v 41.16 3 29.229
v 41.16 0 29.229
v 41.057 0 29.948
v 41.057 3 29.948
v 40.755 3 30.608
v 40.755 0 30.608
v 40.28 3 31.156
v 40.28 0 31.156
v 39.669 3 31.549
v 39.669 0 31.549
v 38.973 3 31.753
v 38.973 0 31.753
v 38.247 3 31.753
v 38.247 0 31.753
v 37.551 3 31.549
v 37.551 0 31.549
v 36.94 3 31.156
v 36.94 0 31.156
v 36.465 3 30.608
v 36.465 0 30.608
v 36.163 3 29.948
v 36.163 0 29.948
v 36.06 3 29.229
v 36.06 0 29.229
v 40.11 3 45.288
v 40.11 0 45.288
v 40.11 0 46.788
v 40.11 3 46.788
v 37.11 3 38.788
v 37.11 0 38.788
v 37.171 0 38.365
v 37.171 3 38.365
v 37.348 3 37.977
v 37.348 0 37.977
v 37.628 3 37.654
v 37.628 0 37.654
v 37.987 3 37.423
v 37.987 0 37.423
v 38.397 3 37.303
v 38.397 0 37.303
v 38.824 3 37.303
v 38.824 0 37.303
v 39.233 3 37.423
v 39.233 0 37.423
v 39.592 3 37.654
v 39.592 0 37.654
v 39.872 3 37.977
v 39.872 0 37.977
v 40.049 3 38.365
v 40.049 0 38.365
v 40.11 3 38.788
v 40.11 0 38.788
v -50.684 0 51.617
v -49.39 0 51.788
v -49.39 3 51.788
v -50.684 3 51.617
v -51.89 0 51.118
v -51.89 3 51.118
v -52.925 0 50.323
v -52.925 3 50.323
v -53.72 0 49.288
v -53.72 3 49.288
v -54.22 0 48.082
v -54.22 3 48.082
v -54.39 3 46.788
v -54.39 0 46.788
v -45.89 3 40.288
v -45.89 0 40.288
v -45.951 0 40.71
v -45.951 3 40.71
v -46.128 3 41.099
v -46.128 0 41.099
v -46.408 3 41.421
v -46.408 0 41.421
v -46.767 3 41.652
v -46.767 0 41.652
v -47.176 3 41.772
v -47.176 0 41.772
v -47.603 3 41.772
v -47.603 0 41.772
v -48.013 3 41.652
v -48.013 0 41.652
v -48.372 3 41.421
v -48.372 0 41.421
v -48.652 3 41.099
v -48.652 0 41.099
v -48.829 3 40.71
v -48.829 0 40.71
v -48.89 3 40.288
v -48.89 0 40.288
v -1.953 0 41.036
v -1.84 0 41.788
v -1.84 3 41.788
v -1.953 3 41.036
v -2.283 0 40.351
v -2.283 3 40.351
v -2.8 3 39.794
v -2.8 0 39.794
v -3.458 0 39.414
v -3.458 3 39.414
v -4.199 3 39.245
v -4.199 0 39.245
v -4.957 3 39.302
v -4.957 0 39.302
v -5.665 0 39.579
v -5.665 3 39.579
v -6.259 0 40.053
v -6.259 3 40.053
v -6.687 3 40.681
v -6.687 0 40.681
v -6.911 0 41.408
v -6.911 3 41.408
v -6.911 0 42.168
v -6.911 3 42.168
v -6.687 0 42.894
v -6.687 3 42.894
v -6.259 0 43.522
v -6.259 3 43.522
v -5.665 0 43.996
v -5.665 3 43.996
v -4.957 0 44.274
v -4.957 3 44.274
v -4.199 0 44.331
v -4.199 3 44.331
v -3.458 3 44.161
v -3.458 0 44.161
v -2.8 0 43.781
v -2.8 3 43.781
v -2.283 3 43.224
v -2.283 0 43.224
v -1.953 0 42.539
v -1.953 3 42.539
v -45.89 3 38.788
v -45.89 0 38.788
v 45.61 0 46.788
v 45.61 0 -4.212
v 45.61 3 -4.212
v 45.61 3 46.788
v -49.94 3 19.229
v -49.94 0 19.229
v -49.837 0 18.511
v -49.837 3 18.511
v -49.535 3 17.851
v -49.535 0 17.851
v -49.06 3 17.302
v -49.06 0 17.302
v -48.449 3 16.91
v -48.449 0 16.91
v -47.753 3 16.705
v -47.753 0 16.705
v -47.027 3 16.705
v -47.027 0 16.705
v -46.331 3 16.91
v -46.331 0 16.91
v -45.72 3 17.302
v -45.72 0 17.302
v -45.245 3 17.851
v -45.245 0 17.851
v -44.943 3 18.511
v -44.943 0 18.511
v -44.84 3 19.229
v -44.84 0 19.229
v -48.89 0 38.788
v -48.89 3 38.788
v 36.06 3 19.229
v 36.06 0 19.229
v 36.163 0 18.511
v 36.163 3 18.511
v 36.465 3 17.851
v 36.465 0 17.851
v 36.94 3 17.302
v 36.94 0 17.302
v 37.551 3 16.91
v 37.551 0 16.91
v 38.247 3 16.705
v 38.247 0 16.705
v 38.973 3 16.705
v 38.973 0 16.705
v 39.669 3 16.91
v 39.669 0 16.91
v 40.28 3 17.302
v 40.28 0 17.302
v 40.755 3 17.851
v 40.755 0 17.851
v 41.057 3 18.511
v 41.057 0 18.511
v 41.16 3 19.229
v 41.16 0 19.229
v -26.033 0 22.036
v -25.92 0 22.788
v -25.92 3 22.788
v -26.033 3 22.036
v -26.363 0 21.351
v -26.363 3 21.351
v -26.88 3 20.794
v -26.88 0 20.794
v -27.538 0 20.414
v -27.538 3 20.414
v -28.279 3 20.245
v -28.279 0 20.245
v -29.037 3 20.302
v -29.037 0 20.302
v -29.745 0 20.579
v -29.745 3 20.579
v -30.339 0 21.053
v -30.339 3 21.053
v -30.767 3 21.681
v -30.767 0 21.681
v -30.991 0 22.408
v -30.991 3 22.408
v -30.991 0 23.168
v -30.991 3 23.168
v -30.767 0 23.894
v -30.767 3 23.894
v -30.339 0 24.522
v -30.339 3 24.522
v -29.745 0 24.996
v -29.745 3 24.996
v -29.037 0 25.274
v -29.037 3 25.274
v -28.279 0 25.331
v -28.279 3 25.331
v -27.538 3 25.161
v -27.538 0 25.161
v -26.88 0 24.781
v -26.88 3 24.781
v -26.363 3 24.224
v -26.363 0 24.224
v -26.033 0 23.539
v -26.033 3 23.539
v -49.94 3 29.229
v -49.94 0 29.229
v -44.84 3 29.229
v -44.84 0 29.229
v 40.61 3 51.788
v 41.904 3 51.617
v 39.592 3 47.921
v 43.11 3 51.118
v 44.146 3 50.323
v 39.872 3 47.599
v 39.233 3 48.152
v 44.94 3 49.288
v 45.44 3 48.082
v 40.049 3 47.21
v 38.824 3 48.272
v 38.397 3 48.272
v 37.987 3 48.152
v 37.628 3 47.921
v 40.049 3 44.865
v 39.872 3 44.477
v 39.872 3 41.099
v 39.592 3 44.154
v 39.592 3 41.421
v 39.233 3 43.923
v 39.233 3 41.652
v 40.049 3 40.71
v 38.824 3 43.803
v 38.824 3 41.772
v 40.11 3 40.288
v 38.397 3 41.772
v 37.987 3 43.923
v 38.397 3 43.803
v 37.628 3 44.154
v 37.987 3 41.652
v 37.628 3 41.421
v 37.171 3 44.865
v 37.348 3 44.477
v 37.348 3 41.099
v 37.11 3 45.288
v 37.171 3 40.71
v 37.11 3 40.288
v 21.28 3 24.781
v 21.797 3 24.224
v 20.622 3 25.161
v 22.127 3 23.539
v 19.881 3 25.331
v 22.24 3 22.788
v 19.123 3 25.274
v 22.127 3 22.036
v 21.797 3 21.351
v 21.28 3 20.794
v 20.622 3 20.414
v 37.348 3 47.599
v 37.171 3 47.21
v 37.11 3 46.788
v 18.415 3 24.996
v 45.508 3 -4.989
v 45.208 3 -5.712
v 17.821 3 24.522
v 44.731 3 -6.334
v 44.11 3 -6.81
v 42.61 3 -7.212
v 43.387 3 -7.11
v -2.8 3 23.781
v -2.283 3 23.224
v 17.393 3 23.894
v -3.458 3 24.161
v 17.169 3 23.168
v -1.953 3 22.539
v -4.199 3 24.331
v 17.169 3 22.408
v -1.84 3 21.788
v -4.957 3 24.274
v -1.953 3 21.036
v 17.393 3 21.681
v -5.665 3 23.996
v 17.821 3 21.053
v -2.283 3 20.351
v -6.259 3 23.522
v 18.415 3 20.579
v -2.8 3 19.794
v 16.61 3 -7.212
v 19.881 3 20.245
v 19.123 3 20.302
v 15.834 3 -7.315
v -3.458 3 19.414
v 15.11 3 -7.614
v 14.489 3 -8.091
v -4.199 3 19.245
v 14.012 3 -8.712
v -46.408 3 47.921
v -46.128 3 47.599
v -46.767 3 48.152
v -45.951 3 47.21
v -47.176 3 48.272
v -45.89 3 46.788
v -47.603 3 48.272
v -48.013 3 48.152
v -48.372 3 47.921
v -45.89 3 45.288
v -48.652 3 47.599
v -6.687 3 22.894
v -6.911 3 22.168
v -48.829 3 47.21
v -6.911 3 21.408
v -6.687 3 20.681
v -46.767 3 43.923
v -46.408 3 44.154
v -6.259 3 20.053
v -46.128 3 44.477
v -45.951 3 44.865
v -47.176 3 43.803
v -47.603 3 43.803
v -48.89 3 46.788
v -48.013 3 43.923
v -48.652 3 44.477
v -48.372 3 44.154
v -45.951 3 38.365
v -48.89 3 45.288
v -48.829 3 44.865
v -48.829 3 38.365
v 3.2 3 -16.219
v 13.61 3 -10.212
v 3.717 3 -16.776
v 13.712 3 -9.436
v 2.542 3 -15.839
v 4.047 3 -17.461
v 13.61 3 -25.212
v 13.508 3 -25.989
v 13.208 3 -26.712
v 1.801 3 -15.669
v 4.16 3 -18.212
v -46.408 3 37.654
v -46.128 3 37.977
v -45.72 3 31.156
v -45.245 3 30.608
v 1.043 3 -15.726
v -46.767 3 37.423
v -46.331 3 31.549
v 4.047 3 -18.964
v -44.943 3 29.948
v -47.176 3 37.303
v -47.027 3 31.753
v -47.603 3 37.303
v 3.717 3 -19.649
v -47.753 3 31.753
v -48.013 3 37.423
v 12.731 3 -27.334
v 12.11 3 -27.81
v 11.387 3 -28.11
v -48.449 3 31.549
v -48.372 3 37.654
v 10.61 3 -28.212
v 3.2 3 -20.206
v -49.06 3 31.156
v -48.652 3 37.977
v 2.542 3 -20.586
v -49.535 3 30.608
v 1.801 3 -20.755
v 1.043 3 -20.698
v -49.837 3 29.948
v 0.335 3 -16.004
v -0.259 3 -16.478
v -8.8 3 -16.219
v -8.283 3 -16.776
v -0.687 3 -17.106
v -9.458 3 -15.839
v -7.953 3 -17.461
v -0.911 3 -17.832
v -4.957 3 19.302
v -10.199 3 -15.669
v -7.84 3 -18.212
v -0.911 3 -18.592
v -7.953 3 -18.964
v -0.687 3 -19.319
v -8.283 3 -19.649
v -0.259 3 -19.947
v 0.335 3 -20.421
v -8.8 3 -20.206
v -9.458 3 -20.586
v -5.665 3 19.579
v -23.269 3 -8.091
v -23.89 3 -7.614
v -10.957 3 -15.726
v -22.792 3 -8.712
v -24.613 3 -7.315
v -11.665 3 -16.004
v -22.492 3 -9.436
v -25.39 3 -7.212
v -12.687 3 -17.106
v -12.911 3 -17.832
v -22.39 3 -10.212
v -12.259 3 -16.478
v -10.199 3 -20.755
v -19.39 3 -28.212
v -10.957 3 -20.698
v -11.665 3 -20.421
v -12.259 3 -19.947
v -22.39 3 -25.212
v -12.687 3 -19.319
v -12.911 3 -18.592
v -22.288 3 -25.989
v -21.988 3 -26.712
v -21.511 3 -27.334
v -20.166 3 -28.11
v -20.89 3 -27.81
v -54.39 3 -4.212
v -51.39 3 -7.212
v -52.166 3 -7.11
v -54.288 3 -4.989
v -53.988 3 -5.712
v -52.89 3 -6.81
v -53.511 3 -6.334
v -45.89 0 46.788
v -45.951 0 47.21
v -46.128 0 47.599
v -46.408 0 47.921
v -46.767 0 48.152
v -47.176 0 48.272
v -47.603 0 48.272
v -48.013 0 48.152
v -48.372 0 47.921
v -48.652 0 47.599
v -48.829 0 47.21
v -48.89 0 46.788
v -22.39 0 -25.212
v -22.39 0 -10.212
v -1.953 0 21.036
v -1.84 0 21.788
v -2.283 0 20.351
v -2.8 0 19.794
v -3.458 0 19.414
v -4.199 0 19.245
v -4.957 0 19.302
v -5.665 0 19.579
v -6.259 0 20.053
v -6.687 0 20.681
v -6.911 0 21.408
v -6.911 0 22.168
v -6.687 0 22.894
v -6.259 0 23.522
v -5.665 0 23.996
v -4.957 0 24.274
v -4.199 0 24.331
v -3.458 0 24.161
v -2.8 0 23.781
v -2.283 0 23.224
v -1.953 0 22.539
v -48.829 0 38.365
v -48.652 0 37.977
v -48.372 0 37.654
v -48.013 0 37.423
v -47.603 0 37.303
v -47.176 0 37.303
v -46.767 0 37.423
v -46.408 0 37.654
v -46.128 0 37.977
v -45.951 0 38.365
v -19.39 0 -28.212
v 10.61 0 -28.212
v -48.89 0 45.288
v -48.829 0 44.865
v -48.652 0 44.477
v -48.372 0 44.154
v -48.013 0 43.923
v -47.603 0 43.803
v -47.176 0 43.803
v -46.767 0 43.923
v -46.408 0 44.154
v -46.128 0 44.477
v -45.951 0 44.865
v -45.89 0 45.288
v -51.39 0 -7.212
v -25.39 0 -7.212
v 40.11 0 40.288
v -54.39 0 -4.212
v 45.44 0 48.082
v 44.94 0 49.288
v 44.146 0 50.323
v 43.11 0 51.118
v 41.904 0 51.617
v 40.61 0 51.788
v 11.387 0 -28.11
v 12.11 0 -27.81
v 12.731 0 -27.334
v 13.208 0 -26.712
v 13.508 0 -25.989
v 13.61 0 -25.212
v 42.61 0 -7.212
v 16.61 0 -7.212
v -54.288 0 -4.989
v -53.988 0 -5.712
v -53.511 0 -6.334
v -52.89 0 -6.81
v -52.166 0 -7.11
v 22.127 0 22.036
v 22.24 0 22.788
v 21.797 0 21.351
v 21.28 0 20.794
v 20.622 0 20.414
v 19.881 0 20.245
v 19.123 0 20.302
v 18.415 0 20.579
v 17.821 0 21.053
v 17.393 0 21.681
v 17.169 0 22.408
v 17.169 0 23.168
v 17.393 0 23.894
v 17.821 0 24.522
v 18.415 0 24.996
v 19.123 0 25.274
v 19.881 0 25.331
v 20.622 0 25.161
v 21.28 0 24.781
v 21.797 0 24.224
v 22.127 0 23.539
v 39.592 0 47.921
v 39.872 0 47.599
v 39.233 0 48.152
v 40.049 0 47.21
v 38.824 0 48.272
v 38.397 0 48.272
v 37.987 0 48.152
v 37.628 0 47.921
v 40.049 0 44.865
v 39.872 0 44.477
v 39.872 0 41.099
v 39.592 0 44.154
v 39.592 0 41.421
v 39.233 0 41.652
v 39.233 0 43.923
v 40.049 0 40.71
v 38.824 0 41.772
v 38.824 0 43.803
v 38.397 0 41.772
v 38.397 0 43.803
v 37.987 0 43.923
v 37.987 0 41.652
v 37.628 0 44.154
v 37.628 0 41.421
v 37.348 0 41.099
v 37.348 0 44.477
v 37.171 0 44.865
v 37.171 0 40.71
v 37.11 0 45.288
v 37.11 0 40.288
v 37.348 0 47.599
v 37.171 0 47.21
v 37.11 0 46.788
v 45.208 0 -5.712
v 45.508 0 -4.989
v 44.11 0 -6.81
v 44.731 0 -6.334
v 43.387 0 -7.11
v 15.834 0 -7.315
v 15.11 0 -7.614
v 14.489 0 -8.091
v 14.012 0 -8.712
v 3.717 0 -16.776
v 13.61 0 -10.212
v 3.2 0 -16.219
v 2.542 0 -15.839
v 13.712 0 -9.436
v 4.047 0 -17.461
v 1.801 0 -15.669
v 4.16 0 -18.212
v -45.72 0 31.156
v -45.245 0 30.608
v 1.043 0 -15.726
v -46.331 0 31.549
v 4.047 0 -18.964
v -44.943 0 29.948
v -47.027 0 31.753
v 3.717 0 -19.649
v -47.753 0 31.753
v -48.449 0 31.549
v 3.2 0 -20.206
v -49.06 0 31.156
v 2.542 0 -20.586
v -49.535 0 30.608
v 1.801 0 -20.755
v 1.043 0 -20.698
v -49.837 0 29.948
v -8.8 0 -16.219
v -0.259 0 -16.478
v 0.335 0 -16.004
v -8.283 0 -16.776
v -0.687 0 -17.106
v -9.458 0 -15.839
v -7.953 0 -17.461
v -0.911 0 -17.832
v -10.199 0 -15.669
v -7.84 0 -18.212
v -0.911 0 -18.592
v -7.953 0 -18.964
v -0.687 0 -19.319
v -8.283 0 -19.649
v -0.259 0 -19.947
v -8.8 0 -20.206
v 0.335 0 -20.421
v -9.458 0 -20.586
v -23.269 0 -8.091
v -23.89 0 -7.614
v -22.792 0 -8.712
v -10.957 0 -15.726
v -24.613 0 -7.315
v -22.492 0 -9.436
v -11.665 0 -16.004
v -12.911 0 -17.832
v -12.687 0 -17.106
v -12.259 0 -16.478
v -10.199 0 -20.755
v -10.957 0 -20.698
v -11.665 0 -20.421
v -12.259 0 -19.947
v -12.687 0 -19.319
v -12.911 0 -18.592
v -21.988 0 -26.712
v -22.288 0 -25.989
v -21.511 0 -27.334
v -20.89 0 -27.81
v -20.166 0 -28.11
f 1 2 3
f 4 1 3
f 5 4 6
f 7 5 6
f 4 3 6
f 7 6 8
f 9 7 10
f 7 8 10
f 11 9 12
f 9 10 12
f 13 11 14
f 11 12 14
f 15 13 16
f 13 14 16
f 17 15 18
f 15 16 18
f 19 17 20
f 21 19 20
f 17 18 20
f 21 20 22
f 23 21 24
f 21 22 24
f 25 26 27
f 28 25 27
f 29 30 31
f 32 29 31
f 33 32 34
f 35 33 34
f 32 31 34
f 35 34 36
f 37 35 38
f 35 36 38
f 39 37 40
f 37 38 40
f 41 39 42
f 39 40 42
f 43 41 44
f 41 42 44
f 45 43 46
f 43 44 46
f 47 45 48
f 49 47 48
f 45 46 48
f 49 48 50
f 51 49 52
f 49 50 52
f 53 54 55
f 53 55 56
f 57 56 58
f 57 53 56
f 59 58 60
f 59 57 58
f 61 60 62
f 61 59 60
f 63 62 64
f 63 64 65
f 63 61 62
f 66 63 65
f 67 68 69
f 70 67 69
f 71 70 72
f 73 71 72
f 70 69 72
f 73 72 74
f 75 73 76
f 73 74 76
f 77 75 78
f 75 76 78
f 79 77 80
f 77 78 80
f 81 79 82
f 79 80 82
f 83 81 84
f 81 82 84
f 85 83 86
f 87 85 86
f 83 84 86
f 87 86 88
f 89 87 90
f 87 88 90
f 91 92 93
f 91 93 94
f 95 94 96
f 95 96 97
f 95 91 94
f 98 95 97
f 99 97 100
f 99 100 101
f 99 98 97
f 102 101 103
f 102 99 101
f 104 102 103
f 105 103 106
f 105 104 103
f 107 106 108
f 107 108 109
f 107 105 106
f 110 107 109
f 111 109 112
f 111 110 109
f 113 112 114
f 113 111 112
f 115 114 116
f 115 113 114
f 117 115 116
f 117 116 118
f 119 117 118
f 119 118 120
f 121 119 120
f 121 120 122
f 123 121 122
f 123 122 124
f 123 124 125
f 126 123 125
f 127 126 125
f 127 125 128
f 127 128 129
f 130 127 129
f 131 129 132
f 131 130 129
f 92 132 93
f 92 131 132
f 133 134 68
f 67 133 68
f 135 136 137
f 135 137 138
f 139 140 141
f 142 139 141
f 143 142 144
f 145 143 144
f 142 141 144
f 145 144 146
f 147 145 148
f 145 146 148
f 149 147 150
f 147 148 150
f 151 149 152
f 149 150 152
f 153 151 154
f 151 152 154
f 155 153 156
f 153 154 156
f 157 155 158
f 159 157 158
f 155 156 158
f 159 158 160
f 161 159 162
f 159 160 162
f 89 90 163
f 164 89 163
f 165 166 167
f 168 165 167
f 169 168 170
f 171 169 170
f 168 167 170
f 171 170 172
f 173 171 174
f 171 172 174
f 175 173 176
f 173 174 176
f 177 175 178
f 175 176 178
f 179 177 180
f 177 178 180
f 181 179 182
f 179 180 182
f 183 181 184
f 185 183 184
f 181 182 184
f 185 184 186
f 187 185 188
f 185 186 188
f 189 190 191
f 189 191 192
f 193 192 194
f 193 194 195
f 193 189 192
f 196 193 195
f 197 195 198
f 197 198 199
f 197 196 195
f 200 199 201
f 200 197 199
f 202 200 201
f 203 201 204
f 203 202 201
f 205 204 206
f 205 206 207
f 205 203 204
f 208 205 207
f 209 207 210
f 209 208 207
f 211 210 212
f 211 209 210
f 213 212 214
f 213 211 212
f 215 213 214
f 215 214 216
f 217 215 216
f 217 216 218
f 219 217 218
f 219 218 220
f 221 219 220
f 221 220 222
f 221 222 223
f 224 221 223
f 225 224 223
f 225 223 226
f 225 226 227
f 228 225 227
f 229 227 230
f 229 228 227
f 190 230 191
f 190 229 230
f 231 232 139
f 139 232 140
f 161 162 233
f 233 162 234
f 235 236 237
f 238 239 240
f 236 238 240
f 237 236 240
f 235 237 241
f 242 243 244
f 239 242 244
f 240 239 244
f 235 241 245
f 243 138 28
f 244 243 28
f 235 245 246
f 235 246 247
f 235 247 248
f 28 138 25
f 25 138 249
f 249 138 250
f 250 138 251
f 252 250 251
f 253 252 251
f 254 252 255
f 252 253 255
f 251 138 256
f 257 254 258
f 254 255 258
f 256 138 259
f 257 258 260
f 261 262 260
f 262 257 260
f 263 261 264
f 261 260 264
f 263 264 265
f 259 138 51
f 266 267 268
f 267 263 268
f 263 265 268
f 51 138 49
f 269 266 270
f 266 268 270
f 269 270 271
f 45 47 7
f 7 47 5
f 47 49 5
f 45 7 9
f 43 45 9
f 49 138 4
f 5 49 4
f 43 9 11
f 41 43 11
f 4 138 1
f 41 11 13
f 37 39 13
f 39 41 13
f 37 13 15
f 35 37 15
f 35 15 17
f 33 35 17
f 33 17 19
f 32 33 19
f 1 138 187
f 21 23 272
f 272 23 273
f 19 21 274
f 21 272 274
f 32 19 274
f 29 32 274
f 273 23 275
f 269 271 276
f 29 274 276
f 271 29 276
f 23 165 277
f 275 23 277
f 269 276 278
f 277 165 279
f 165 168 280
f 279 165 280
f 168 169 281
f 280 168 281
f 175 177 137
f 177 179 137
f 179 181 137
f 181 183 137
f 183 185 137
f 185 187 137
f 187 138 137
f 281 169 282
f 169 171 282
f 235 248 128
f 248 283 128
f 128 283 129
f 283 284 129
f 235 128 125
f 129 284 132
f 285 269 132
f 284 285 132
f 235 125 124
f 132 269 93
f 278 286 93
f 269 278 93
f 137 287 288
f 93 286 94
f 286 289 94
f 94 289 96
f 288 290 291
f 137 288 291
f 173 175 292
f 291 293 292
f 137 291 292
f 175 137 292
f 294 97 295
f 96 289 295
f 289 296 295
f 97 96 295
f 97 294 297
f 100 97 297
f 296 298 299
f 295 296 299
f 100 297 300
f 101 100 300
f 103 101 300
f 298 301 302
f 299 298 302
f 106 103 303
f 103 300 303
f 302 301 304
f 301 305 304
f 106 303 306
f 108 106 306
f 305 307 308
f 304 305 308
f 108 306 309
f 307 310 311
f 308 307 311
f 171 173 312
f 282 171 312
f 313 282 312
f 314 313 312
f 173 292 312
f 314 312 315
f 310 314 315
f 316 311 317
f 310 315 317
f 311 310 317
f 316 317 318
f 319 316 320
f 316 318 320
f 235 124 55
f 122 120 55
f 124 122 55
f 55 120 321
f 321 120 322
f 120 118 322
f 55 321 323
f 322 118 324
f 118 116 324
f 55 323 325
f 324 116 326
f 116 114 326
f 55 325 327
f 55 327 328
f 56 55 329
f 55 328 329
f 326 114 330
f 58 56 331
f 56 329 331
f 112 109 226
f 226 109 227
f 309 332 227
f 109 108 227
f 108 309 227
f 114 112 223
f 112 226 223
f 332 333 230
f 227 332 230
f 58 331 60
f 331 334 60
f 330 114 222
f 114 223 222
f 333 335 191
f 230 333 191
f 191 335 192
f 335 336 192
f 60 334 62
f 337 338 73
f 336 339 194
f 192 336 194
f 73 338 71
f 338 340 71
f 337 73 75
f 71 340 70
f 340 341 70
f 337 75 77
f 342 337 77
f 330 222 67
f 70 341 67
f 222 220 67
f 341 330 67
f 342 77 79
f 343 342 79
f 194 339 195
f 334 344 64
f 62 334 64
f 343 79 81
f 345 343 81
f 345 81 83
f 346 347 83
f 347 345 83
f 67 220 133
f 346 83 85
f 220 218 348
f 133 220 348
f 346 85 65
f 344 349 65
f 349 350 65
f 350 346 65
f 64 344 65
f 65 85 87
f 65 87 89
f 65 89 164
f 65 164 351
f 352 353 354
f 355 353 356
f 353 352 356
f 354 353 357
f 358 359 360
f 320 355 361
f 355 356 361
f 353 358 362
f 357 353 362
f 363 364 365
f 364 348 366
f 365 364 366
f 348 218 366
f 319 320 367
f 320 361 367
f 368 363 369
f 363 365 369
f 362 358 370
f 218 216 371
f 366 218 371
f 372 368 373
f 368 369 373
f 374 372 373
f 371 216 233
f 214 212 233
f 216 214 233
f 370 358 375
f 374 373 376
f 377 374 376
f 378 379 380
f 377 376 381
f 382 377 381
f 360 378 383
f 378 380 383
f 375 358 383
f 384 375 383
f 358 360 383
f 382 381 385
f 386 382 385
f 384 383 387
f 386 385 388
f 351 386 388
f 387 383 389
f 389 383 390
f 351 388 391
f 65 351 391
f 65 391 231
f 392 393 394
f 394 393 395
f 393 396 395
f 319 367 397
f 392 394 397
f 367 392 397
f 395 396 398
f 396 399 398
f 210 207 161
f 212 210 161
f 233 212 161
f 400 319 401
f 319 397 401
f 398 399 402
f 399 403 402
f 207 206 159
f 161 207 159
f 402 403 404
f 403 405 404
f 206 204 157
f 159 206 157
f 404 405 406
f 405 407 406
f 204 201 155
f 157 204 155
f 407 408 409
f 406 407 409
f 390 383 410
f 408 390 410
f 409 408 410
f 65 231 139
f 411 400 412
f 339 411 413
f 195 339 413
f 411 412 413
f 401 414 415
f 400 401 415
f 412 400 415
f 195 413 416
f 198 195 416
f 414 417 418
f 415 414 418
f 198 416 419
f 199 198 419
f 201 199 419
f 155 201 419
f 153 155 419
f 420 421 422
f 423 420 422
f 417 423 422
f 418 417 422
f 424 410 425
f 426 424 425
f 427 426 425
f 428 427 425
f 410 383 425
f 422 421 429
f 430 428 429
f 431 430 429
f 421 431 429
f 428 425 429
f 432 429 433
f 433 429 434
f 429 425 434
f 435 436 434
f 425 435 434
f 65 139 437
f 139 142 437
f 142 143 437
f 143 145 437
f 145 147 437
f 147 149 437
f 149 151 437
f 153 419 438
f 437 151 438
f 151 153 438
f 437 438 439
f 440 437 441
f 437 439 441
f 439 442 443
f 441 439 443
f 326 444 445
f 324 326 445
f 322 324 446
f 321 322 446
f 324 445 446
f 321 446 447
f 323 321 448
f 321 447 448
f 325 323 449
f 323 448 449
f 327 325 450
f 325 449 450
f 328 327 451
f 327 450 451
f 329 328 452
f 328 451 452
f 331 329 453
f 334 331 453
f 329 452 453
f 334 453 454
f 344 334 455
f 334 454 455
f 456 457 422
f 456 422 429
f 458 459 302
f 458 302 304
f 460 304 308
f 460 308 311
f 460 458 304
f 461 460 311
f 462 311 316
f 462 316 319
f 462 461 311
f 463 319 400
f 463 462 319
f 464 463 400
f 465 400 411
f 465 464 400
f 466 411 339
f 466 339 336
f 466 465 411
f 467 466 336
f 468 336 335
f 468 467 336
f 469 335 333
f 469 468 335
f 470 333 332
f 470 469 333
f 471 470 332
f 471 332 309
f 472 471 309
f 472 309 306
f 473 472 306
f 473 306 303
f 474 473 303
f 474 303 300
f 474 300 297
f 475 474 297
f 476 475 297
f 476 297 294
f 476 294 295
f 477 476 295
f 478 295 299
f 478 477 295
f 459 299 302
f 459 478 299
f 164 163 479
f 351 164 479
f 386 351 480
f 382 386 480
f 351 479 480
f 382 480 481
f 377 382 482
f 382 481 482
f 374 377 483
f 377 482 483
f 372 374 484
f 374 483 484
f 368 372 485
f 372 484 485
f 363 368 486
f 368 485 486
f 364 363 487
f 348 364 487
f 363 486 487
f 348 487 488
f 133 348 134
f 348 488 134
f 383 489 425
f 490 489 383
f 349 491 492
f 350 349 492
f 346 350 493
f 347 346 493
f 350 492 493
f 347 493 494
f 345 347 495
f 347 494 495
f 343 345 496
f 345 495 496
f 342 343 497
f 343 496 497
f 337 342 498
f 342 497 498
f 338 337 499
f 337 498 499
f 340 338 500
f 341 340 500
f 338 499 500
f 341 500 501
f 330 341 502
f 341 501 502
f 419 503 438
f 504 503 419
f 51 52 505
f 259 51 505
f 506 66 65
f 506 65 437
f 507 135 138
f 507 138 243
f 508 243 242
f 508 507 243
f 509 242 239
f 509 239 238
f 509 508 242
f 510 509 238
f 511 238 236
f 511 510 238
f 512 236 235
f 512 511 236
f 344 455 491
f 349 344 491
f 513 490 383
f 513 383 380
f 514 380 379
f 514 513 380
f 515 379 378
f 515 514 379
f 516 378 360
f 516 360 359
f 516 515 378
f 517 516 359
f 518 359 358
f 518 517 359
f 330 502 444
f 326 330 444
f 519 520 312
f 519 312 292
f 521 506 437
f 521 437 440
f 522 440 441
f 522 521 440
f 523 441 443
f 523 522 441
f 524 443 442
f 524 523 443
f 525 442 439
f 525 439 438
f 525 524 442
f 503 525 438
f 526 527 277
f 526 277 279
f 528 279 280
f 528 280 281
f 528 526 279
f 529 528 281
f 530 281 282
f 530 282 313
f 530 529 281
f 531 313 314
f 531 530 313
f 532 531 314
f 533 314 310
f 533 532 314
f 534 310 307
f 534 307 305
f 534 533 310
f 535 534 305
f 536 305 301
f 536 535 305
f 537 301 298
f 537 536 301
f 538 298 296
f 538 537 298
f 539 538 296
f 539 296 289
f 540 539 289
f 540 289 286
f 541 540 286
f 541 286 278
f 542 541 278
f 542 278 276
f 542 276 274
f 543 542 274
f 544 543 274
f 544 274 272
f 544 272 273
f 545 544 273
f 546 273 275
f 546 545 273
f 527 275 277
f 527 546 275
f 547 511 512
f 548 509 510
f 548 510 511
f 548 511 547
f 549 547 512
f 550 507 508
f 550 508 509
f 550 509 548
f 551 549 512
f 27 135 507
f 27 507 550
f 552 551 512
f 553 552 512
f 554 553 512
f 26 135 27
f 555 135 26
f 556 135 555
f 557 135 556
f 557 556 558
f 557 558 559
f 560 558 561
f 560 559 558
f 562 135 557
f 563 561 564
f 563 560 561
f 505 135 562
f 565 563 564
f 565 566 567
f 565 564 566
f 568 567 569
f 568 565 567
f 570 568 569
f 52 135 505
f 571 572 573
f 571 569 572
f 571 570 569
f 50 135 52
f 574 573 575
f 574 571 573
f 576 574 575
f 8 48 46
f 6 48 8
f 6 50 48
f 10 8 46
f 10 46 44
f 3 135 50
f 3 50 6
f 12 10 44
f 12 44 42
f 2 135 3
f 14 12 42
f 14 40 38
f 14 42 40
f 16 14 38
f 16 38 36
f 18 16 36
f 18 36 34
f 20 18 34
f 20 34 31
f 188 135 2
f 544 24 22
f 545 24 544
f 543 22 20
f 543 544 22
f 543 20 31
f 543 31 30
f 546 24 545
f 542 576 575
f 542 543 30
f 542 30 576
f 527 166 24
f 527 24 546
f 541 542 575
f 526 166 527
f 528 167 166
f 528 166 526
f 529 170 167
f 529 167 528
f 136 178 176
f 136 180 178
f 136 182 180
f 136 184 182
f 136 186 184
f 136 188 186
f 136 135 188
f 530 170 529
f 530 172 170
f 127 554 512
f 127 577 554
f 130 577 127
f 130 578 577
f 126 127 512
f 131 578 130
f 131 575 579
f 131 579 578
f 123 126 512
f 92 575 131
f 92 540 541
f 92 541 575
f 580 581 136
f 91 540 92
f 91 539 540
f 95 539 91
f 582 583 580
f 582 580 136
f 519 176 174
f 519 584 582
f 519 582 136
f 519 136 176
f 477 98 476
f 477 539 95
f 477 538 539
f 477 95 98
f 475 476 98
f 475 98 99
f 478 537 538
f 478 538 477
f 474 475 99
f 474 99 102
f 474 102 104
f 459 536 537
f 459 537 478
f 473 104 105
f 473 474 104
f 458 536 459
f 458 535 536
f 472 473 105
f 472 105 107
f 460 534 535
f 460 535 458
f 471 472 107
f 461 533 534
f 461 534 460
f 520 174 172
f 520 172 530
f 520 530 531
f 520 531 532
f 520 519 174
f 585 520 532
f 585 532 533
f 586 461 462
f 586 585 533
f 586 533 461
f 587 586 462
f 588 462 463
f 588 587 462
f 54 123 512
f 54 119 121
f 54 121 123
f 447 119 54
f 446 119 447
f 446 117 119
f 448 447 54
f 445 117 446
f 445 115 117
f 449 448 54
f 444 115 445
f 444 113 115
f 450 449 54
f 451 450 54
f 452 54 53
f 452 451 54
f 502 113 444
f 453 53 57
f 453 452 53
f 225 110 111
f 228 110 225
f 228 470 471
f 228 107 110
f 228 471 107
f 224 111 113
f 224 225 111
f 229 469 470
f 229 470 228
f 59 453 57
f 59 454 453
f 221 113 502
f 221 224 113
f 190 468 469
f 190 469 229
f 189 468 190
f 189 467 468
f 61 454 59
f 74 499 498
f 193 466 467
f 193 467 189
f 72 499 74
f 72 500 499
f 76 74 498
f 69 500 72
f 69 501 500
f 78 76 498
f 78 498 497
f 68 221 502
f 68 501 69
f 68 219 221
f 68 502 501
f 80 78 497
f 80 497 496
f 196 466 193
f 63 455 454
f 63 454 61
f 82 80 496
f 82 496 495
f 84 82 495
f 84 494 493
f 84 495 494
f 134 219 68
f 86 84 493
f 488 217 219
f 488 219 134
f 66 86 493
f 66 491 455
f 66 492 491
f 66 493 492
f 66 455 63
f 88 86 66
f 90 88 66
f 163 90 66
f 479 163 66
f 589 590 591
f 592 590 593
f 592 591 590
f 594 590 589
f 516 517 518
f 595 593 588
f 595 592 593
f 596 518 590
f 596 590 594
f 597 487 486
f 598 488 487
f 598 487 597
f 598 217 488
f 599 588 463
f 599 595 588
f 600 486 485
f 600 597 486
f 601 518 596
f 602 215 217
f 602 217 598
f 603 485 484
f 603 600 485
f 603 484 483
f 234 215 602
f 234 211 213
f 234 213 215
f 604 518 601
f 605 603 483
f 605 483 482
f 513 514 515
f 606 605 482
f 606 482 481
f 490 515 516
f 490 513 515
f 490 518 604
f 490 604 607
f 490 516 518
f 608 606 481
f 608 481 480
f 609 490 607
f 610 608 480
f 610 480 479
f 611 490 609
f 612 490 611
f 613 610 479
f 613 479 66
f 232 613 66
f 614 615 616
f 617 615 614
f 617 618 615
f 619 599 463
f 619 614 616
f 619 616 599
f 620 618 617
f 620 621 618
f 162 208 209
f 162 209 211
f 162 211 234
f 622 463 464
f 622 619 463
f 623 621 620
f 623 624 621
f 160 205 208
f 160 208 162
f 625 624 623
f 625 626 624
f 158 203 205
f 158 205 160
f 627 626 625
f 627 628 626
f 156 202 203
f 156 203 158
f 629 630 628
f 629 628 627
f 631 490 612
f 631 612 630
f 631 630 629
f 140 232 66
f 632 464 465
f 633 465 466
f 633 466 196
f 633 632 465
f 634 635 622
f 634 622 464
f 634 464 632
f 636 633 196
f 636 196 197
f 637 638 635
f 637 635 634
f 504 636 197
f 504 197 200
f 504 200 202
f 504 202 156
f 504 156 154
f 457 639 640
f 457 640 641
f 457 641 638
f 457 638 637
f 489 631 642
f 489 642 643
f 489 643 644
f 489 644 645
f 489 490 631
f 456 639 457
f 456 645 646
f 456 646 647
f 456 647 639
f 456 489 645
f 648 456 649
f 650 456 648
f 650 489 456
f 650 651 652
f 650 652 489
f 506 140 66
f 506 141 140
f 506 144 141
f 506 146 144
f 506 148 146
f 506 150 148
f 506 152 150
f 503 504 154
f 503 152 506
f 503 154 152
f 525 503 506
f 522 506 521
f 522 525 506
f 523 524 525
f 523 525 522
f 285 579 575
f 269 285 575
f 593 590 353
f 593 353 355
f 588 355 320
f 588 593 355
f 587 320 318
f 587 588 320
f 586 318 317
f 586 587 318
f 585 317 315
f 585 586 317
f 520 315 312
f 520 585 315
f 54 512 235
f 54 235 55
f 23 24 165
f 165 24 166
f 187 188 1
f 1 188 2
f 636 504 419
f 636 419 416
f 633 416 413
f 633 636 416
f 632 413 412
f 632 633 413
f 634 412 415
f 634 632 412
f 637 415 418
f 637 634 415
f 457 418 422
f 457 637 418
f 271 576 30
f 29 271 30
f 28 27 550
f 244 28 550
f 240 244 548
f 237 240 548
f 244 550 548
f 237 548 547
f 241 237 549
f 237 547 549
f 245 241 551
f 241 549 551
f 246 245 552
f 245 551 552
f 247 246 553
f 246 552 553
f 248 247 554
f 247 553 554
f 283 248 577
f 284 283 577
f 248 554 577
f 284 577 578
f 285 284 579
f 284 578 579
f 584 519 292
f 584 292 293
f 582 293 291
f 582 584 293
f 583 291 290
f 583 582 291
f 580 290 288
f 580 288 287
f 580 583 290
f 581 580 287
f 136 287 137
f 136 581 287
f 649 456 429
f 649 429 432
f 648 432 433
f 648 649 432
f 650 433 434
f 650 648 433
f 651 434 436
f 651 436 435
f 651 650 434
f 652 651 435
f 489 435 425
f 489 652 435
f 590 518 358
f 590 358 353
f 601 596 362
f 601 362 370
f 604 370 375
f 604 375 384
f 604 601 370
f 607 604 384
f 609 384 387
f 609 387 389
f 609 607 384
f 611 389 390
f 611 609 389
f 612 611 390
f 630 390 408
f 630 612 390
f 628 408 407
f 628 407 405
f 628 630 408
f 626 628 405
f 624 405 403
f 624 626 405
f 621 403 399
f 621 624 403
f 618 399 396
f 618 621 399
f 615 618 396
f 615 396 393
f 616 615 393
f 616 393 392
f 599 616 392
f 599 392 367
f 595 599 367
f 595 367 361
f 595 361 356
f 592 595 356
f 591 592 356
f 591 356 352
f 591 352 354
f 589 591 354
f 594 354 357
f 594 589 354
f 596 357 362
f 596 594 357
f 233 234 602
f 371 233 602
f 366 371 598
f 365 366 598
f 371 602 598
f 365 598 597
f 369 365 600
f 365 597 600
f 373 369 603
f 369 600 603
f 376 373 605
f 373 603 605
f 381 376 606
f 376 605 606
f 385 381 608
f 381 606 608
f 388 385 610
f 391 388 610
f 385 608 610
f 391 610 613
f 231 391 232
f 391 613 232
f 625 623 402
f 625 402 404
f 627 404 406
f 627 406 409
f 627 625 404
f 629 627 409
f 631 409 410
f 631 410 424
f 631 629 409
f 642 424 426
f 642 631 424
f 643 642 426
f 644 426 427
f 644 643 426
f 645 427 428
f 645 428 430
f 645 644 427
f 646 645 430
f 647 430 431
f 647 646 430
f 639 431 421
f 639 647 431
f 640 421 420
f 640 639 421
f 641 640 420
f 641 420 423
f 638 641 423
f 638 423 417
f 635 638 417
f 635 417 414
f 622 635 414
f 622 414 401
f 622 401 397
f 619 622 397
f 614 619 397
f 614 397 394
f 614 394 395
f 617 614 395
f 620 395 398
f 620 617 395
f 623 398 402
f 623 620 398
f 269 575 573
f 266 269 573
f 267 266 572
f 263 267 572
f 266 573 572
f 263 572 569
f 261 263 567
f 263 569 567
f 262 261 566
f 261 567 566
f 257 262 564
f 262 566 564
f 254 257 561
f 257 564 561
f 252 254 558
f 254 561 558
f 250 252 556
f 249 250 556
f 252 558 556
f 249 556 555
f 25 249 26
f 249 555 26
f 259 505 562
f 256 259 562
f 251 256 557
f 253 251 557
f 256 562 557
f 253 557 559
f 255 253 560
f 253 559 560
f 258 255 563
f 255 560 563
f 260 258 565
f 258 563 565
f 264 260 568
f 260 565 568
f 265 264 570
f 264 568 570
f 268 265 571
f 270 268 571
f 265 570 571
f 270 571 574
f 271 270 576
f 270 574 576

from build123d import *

# Parameters (mm, degrees)
SKETCH1_R           = 2.55
BOSS_EXTRUDE1_DEPTH = 3


with BuildPart() as part:
    # Sketch1 → Boss-Extrude1 (new body)
    with BuildSketch(Plane(origin=(0, 0, 0), x_dir=(1, 0, 0), z_dir=(0, 1, 0))):
        with BuildLine():
            Line((-19.389943983, 28.212319901), (10.610056017, 28.212319901))
            ThreePointArc((10.610056017, 28.212319901), (12.731376361, 27.333640245), (13.610056017, 25.212319901))
            Line((13.610056017, 25.212319901), (13.610056017, 10.212319901))
            ThreePointArc((13.610056017, 10.212319901), (14.488735674, 8.090999558), (16.610056017, 7.212319901))
            Line((16.610056017, 7.212319901), (32.610056017, 7.212319901))
            Line((32.610056017, 7.212319901), (42.610056017, 7.212319901))
            ThreePointArc((42.610056017, 7.212319901), (44.731376361, 6.333640245), (45.610056017, 4.212319901))
            Line((45.610056017, 4.212319901), (45.610056017, -46.787680099))
            ThreePointArc((45.610056017, -46.787680099), (44.145589923, -50.323214005), (40.610056017, -51.787680099))
            Line((40.610056017, -51.787680099), (-49.389943983, -51.787680099))
            ThreePointArc((-49.389943983, -51.787680099), (-52.925477889, -50.323214005), (-54.389943983, -46.787680099))
            Line((-54.389943983, -46.787680099), (-54.389943983, 4.212319901))
            ThreePointArc((-54.389943983, 4.212319901), (-53.511264326, 6.333640245), (-51.389943983, 7.212319901))
            Line((-51.389943983, 7.212319901), (-41.389943983, 7.212319901))
            Line((-41.389943983, 7.212319901), (-25.389943983, 7.212319901))
            ThreePointArc((-25.389943983, 7.212319901), (-23.268623639, 8.090999558), (-22.389943983, 10.212319901))
            Line((-22.389943983, 10.212319901), (-22.389943983, 25.212319901))
            ThreePointArc((-22.389943983, 25.212319901), (-21.511264326, 27.333640245), (-19.389943983, 28.212319901))
        make_face()
        with Locations((-10.389943983, 18.212319901)):
            Circle(SKETCH1_R, mode=Mode.SUBTRACT)
        with Locations((1.610056017, 18.212319901)):
            Circle(SKETCH1_R, mode=Mode.SUBTRACT)
        with Locations((-4.389943983, -41.787680099)):
            Circle(SKETCH1_R, mode=Mode.SUBTRACT)
        with Locations((-4.389943983, -21.787680099)):
            Circle(SKETCH1_R, mode=Mode.SUBTRACT)
        with Locations((-28.469943983, -22.787680099)):
            Circle(SKETCH1_R, mode=Mode.SUBTRACT)
        with Locations((19.690056017, -22.787680099)):
            Circle(SKETCH1_R, mode=Mode.SUBTRACT)
        with BuildLine():
            Line((40.110056017, -38.787680099), (40.110056017, -40.287680099))
            ThreePointArc((40.110056017, -40.287680099), (38.610056017, -41.787680099), (37.110056017, -40.287680099))
            Line((37.110056017, -40.287680099), (37.110056017, -38.787680099))
            ThreePointArc((37.110056017, -38.787680099), (38.610056017, -37.287680099), (40.110056017, -38.787680099))
        make_face(mode=Mode.SUBTRACT)
        with BuildLine():
            Line((37.110056017, -46.787680099), (37.110056017, -45.287680099))
            ThreePointArc((37.110056017, -45.287680099), (38.610056017, -43.787680099), (40.110056017, -45.287680099))
            Line((40.110056017, -45.287680099), (40.110056017, -46.787680099))
            ThreePointArc((40.110056017, -46.787680099), (38.610056017, -48.287680099), (37.110056017, -46.787680099))
        make_face(mode=Mode.SUBTRACT)
        with BuildLine():
            Line((41.160056017, -19.229266089), (41.160056017, -29.229266089))
            ThreePointArc((41.160056017, -29.229266089), (38.610056017, -31.779266089), (36.060056017, -29.229266089))
            Line((36.060056017, -29.229266089), (36.060056017, -19.229266089))
            ThreePointArc((36.060056017, -19.229266089), (38.610056017, -16.679266089), (41.160056017, -19.229266089))
        make_face(mode=Mode.SUBTRACT)
        with BuildLine():
            Line((-45.889943983, -38.787680099), (-45.889943983, -40.287680099))
            ThreePointArc((-45.889943983, -40.287680099), (-47.389943983, -41.787680099), (-48.889943983, -40.287680099))
            Line((-48.889943983, -40.287680099), (-48.889943983, -38.787680099))
            ThreePointArc((-48.889943983, -38.787680099), (-47.389943983, -37.287680099), (-45.889943983, -38.787680099))
        make_face(mode=Mode.SUBTRACT)
        with BuildLine():
            Line((-48.889943983, -46.787680099), (-48.889943983, -45.287680099))
            ThreePointArc((-48.889943983, -45.287680099), (-47.389943983, -43.787680099), (-45.889943983, -45.287680099))
            Line((-45.889943983, -45.287680099), (-45.889943983, -46.787680099))
            ThreePointArc((-45.889943983, -46.787680099), (-47.389943983, -48.287680099), (-48.889943983, -46.787680099))
        make_face(mode=Mode.SUBTRACT)
        with BuildLine():
            Line((-44.839943983, -19.229266089), (-44.839943983, -29.229266089))
            ThreePointArc((-44.839943983, -29.229266089), (-47.389943983, -31.779266089), (-49.939943983, -29.229266089))
            Line((-49.939943983, -29.229266089), (-49.939943983, -19.229266089))
            ThreePointArc((-49.939943983, -19.229266089), (-47.389943983, -16.679266089), (-44.839943983, -19.229266089))
        make_face(mode=Mode.SUBTRACT)
    extrude(amount=BOSS_EXTRUDE1_DEPTH)


solid = part.part
